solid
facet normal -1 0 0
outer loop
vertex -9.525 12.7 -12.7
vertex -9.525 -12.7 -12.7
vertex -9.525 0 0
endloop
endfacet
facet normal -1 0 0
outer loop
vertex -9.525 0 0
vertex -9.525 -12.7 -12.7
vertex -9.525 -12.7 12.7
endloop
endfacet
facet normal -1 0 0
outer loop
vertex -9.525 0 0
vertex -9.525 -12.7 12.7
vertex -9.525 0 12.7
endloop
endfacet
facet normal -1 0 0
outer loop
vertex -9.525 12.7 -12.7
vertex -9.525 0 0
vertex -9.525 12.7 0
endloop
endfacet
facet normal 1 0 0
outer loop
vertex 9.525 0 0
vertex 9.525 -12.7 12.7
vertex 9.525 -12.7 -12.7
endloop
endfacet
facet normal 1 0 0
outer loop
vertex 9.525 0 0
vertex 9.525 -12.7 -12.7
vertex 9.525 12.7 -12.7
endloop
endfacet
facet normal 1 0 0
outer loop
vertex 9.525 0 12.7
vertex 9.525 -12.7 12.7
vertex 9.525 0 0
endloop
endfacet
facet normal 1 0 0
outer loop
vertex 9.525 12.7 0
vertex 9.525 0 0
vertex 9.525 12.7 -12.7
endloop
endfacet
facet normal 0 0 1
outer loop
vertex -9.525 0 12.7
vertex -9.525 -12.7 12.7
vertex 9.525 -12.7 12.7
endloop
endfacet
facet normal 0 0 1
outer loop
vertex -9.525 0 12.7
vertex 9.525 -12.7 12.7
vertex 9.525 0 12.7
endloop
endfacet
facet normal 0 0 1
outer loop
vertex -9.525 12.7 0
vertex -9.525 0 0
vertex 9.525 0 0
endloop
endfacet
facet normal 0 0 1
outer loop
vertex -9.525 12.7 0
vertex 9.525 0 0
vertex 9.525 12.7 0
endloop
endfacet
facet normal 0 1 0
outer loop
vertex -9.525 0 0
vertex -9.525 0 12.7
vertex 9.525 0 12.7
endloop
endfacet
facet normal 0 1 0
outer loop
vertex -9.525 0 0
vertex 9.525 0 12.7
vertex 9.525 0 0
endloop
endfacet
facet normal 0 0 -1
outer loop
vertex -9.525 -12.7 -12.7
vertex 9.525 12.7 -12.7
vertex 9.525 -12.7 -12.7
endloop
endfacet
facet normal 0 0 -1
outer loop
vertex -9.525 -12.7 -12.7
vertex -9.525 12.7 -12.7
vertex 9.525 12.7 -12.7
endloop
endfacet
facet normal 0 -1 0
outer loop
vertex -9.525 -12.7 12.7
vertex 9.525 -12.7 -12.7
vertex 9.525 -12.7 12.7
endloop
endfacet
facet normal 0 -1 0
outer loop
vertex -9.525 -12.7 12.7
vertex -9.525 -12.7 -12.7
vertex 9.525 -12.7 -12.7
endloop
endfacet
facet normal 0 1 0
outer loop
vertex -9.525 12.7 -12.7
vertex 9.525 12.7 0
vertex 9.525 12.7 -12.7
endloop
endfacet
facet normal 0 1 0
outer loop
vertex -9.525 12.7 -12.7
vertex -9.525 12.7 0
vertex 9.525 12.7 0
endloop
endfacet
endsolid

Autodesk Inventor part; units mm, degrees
ref_plane "YZ Plane" through (0, 0, 0) normal (1, 0, 0) x (0, 1, 0)
ref_plane "XZ Plane" through (0, 0, 0) normal (0, 1, 0) x (-1, 0, 0)
ref_plane "XY Plane" through (0, 0, 0) normal (0, 0, 1) x (1, 0, 0)
sketch "Sketch1" plane through (0, 0, 0) normal (1, 0, 0) x (0, 1, 0)
  line L0 (-12.7, 12.7) -> (0, 12.7)
  line L1 (12.7, 0) -> (12.7, -12.7)
  line L2 (12.7, -12.7) -> (-12.7, -12.7)
  line L3 (-12.7, -12.7) -> (-12.7, 12.7)
  line L4 (-12.7, 12.7) -> (12.7, -12.7) construction
  line L5 (0, 0) -> (-12.7, -12.7) construction
  line L6 (0, 0) -> (12.7, 0)
  line L7 (0, 12.7) -> (0, 0)
  line L8 (12.7, 0) -> (0, 0)
  dimension "d0" = 25.4
extrude "Extrusion1" add sketch "Sketch1" along normal mid plane 19.05
ref_plane "Work Plane2" through (29.3294, 29.3294, 29.3294) normal (0.5774, 0.5774, 0.5774) x (0.7071, 0, -0.7071)
ref_plane "Work Plane1" through (0, 0, 0) normal (0.5774, 0.5774, 0.5774) x (0.7071, 0, -0.7071)
sketch "Sketch2" plane through (29.3294, 29.3294, 29.3294) normal (0.5774, 0.5774, 0.5774) x (0.7071, 0, -0.7071)
  line L0 (-6.7352, 14.2581) -> (6.7352, 6.4809) construction
  line L1 (15.7154, 11.6657) -> (6.7352, 6.4809) construction
  line L2 (2.2451, 19.4428) -> (15.7154, 11.6657) construction
  line L3 (-6.7352, 14.2581) -> (2.2451, 19.4428) construction
  line L4 (-6.7352, 3.8886) -> (6.7352, -3.8886) construction
  line L5 (6.7352, 6.4809) -> (6.7352, -3.8886) construction
  line L6 (-6.7352, 14.2581) -> (6.7352, 6.4809) construction
  line L7 (-6.7352, 3.8886) -> (-6.7352, 14.2581) construction
  line L8 (-2.2451, -9.0733) -> (-15.7154, -1.2962) construction
  line L9 (6.7352, -3.8886) -> (-2.2451, -9.0733) construction
  line L10 (-6.7352, 3.8886) -> (6.7352, -3.8886) construction
  line L11 (-15.7154, -1.2962) -> (-6.7352, 3.8886) construction
  line L12 (-15.7154, -11.6657) -> (-2.2451, -19.4428) construction
  line L13 (-2.2451, -9.0733) -> (-2.2451, -19.4428) construction
  line L14 (-2.2451, -9.0733) -> (-15.7154, -1.2962) construction
  line L15 (-15.7154, -11.6657) -> (-15.7154, -1.2962) construction
  line L16 (-2.2451, -9.0733) -> (-2.2451, -19.4428) construction
  line L17 (-2.2451, -19.4428) -> (15.7154, -9.0733) construction
  line L18 (15.7154, -9.0733) -> (15.7154, 11.6657) construction
  line L19 (15.7154, 11.6657) -> (6.7352, 6.4809) construction
  line L20 (6.7352, 6.4809) -> (6.7352, -3.8886) construction
  line L21 (6.7352, -3.8886) -> (-2.2451, -9.0733) construction
  line L22 (6.7352, 6.7742) -> (-6.2272, 14.2581)
  line L23 (-6.2272, 14.2581) -> (2.2451, 19.1495)
  line L24 (2.2451, 19.1495) -> (15.2074, 11.6657)
  line L25 (15.2074, 11.6657) -> (6.7352, 6.7742)
  line L26 (-6.4812, 13.8181) -> (6.4812, 6.3343)
  line L27 (6.4812, 6.3343) -> (6.4812, -3.4486)
  line L28 (6.4812, -3.4486) -> (-6.4812, 4.0352)
  line L29 (-6.4812, 4.0352) -> (-6.4812, 13.8181)
  line L30 (-6.7352, 3.5953) -> (6.2272, -3.8886)
  line L31 (6.2272, -3.8886) -> (-2.2451, -8.78)
  line L32 (-2.2451, -8.78) -> (-15.2074, -1.2962)
  line L33 (-15.2074, -1.2962) -> (-6.7352, 3.5953)
  line L34 (-15.4614, -1.7361) -> (-2.4991, -9.22)
  line L35 (-2.4991, -9.22) -> (-2.4991, -19.0029)
  line L36 (-2.4991, -19.0029) -> (-15.4614, -11.519)
  line L37 (-15.4614, -11.519) -> (-15.4614, -1.7361)
  line L38 (15.4614, 11.2258) -> (15.4614, -8.9267)
  line L39 (15.4614, -8.9267) -> (-1.9911, -19.0029)
  line L40 (-1.9911, -19.0029) -> (-1.9911, -9.22)
  line L41 (-1.9911, -9.22) -> (6.9892, -4.0352)
  line L42 (6.9892, -4.0352) -> (6.9892, 6.3343)
  line L43 (6.9892, 6.3343) -> (15.4614, 11.2258)
  point P0 (0, 0)
  dimension "d5" = 0.254
  dimension "d6" = 0.254
  dimension "d7" = 0.254
  dimension "d8" = 0.254
  dimension "d9" = 0.254
equation "\"d5\" = 0.5 * spacing"
equation "\"d6\" = 0.5 * spacing"
equation "\"d7\" = 0.5 * spacing"
equation "\"d8\" = 0.5 * spacing"
equation "\"d9\" = 0.5 * spacing"
equation "\"spacing\" = 0.508"
properties part number "iso"
